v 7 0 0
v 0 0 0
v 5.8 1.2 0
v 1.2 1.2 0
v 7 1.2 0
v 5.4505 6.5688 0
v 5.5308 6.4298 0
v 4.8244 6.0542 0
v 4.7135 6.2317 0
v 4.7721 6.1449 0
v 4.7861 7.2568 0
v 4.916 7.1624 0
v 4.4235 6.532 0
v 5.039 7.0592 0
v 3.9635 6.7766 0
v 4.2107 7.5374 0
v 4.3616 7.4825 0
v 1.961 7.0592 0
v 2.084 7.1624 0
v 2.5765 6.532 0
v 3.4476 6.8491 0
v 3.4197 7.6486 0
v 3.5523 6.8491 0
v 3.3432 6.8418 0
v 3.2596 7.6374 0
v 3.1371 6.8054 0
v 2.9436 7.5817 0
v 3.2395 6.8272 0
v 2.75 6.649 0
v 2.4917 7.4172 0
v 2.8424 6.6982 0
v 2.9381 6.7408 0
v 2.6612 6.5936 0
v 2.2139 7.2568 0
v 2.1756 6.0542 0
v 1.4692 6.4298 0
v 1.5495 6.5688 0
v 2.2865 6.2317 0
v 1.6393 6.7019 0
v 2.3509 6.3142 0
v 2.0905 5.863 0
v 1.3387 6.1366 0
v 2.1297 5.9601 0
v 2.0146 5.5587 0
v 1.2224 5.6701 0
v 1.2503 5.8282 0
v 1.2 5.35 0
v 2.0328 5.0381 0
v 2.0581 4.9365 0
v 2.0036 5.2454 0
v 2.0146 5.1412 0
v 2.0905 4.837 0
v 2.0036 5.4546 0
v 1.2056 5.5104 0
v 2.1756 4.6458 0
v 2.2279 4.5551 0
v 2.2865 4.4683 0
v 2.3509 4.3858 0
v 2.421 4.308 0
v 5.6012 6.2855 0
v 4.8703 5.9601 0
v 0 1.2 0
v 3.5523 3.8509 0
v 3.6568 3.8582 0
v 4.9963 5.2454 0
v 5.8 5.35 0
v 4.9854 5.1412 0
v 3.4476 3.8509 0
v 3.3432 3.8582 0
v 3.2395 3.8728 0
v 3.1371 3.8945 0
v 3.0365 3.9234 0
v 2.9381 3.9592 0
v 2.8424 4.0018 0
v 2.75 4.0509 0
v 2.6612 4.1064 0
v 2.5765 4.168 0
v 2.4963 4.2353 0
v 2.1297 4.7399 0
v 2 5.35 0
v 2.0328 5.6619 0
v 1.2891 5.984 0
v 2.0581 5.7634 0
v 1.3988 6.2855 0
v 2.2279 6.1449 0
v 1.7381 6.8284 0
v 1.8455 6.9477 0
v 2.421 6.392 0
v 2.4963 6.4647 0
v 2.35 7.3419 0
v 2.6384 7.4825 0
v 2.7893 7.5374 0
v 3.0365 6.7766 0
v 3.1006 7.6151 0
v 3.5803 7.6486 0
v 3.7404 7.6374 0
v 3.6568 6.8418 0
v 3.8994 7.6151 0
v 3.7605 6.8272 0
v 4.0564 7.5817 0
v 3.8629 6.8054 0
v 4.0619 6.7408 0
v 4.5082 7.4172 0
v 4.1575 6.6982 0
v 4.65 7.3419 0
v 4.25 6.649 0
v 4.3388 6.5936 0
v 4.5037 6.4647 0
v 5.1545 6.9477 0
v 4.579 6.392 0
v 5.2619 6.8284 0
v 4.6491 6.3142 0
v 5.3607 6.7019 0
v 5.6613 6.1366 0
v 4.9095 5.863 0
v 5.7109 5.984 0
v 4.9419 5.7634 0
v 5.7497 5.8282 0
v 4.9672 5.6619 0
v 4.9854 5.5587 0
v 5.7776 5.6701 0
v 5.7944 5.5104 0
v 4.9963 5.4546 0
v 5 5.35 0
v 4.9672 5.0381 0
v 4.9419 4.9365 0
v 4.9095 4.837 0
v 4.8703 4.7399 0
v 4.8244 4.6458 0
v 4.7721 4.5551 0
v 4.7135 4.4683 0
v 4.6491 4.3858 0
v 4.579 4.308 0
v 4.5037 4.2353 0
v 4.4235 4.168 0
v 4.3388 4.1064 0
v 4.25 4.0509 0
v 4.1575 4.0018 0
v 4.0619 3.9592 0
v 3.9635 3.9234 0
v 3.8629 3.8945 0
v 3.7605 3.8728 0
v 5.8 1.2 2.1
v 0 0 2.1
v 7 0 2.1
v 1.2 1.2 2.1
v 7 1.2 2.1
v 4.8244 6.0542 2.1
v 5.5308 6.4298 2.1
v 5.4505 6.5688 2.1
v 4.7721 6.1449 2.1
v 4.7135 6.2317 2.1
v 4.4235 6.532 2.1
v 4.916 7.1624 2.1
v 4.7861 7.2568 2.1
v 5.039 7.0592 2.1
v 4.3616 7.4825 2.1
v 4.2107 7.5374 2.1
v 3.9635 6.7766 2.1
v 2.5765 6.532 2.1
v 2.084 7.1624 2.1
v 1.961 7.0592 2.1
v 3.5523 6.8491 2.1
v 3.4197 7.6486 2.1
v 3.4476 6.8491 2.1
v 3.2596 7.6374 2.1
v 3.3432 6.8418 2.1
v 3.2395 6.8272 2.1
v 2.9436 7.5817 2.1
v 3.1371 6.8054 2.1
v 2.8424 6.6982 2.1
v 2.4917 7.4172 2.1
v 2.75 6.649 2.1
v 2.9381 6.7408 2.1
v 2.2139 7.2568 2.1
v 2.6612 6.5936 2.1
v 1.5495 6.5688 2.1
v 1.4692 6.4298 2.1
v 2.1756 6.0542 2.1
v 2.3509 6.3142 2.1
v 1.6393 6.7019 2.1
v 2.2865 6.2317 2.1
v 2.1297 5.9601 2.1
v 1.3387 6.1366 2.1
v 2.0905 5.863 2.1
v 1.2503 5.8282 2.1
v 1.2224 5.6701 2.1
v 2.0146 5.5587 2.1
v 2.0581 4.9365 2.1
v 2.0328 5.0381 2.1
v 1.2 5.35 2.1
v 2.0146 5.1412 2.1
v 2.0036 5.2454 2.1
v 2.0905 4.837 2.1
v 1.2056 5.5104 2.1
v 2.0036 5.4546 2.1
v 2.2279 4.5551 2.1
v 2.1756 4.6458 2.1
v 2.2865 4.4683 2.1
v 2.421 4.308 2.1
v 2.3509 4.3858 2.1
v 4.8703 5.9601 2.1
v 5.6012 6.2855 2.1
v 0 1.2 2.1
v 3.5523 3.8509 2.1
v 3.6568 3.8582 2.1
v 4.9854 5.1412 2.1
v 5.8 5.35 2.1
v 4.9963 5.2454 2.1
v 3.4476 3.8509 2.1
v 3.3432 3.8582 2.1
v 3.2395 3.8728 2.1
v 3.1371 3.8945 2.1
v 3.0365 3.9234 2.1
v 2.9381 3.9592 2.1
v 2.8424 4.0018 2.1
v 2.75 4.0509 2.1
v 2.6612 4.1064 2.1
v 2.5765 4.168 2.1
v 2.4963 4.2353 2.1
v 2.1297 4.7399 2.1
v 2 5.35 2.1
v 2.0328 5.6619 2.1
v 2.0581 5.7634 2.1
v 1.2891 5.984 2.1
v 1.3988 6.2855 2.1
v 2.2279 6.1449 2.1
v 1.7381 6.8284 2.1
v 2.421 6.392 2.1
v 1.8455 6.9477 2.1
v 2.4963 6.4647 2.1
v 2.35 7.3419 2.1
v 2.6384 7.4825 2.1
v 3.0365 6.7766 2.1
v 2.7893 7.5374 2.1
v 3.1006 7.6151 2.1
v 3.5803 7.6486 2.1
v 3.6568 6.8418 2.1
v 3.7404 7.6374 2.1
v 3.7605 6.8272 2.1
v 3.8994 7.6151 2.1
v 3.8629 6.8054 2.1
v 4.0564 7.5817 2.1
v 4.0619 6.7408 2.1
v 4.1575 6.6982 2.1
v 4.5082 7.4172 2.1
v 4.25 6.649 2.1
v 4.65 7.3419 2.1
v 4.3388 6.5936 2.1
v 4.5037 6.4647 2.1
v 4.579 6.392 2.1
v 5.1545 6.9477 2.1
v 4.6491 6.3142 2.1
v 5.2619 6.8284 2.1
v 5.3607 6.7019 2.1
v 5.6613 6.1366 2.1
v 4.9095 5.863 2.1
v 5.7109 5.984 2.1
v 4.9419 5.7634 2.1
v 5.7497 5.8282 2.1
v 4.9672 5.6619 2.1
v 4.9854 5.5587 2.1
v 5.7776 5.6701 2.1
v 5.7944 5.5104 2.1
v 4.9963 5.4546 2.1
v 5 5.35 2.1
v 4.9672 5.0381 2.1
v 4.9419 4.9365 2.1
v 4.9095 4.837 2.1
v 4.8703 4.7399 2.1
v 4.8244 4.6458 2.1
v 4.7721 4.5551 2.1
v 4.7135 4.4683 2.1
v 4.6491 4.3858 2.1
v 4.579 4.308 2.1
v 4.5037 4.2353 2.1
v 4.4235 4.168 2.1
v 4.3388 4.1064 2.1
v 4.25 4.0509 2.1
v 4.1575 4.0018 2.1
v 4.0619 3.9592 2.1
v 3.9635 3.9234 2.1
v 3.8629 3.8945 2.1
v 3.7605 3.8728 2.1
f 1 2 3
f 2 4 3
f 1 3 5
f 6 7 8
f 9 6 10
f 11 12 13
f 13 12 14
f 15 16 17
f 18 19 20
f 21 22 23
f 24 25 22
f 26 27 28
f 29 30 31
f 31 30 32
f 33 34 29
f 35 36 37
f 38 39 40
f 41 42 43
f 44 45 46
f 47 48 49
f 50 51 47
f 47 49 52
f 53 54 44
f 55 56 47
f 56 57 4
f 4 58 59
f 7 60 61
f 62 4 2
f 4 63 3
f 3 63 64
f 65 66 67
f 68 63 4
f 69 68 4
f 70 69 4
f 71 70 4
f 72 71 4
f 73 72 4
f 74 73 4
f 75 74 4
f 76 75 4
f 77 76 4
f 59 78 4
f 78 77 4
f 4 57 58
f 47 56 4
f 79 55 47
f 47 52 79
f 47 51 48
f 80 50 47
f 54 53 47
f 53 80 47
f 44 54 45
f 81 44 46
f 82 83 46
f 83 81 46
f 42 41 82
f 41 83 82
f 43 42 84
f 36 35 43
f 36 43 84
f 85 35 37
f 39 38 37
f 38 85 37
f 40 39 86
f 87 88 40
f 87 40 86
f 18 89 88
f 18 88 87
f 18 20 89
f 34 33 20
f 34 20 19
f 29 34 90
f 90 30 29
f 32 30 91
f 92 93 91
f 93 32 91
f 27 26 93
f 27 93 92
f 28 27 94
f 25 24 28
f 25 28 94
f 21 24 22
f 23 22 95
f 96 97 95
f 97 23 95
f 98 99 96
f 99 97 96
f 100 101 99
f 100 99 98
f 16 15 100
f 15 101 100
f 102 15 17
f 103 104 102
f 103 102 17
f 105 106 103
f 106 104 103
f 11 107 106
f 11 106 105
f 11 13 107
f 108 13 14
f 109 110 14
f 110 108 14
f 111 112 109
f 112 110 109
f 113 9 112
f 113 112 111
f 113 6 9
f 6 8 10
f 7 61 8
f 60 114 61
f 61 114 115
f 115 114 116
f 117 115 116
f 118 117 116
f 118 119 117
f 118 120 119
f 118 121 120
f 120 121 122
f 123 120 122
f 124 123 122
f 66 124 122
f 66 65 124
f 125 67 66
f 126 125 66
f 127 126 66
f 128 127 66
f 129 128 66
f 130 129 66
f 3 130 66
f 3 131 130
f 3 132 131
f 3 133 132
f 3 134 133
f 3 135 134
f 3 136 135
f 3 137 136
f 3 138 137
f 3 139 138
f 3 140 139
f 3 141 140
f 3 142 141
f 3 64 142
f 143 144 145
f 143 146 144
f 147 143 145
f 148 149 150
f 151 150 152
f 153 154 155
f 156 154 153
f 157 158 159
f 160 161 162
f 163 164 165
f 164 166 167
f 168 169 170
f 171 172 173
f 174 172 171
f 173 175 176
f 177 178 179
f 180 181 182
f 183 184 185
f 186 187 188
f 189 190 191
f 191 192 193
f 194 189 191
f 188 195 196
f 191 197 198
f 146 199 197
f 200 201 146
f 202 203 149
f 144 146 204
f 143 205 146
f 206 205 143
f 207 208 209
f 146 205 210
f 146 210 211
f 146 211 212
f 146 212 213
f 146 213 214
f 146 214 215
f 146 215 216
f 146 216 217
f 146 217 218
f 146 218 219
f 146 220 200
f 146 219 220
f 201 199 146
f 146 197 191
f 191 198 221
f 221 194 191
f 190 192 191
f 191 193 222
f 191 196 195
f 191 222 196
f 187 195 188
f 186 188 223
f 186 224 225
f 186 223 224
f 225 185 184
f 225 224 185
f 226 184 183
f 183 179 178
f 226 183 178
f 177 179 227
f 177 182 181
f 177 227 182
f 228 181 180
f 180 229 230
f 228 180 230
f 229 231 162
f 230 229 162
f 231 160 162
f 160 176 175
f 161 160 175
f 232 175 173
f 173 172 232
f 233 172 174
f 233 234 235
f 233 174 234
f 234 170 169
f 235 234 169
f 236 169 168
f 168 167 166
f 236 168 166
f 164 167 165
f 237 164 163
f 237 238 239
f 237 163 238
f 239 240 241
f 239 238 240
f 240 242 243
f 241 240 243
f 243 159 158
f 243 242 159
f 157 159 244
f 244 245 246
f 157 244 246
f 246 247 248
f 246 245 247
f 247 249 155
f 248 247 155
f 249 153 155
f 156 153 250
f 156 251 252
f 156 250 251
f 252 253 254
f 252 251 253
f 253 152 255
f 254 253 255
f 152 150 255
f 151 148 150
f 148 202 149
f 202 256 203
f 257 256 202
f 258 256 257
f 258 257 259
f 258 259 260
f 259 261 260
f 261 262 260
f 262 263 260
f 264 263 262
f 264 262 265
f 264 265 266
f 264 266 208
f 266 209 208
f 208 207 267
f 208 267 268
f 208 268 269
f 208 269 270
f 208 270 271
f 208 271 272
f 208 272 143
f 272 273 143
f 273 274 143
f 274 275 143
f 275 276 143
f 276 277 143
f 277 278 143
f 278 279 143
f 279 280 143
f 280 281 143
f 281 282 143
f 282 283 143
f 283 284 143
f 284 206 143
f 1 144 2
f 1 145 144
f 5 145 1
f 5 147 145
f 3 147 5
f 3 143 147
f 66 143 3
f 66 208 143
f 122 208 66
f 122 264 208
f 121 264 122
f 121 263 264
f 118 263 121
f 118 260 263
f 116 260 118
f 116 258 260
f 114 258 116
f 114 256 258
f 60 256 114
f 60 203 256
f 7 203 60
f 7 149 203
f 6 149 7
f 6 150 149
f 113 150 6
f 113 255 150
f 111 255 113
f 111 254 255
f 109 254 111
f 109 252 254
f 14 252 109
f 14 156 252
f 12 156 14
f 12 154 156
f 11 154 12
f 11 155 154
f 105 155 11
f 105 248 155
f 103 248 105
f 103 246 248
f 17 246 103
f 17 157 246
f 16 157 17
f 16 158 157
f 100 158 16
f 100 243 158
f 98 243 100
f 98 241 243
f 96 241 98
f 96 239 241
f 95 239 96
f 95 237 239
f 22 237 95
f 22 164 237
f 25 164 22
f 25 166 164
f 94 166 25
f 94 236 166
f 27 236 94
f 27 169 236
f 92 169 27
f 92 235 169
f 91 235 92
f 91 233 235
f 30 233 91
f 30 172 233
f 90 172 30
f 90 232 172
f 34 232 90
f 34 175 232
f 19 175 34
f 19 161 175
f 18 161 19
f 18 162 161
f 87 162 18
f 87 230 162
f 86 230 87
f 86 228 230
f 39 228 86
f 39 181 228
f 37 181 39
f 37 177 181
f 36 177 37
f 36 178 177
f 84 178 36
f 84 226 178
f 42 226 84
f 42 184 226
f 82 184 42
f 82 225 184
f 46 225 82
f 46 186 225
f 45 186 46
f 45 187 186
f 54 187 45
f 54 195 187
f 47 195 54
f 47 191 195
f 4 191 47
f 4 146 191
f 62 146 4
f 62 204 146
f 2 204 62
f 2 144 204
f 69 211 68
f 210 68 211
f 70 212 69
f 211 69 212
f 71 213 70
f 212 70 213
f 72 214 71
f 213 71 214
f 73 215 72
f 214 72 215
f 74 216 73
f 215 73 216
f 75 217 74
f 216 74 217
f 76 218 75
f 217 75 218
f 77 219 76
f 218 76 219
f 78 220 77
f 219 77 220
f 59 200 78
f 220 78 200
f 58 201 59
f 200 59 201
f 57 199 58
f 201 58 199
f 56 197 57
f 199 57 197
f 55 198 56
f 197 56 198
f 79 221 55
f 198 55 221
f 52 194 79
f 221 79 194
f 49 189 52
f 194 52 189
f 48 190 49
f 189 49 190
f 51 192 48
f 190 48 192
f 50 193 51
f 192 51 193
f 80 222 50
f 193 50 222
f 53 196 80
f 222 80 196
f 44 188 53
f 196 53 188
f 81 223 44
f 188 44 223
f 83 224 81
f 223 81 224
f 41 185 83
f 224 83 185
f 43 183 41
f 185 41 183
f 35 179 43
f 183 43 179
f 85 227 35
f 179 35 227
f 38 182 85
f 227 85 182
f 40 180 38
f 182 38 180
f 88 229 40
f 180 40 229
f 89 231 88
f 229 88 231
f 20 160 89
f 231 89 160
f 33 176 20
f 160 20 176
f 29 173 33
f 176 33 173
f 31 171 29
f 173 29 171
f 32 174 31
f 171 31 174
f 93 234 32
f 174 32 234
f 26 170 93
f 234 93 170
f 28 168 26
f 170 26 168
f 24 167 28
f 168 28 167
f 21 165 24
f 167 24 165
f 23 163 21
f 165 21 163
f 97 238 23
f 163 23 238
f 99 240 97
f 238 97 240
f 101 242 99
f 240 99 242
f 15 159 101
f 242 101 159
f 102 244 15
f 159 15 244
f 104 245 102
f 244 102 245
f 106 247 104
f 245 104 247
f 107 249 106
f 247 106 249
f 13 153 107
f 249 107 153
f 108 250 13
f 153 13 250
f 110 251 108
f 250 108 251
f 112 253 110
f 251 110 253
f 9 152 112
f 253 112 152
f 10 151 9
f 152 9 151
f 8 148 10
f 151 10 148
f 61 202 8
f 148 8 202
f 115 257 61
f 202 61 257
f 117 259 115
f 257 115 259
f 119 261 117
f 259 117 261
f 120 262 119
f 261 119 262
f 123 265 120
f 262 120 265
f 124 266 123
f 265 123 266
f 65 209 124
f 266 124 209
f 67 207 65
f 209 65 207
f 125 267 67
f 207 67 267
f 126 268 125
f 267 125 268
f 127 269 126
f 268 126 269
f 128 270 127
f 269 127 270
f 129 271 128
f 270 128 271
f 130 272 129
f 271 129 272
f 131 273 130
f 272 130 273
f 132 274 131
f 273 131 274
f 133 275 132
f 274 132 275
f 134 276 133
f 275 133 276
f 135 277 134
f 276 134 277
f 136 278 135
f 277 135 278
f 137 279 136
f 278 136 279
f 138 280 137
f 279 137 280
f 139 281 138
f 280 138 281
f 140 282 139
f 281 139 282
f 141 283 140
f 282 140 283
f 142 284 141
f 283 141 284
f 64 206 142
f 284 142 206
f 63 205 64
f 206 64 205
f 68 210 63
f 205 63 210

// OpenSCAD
hole_rad = 2.5;
hole_height = 2.1;
hole_tolerance = .4;

base_length = (.2 * 6);
base_width = hole_rad * 2 + 2;

center_width = base_length /2;



linear_extrude(height=hole_rad - hole_tolerance) {

    // Base
    square([base_width, base_length], center=false);


    // Stem
    stem_length = hole_height + (hole_height/2) + 1;
    stem_width = (hole_rad * 2) - hole_tolerance;
    stem_left = (base_width - stem_width) /2 ;

    echo(stem_width=stem_width);
    echo(stem_length=stem_length);
    echo(base_width=base_width);
    echo(base_length=base_length);
            $fn = 90;
    difference() {

            // Loop
            loop_rad = stem_width / 2;
            loop_bottom = base_length + stem_length + loop_rad;
            loop_left = base_width / 2;
            loop_thickness = 1;

        union() {

            translate([stem_left,base_length])
                square([stem_width, stem_length], center=false);



            echo(loop_rad=loop_rad);
            echo(loop_bottom=loop_bottom);
            echo(loop_left=loop_left);


            translate([loop_left, loop_bottom - loop_rad ])
                    circle(r=loop_rad);
        }

        // Loop Hole
        translate([loop_left, loop_bottom - loop_rad])
            circle(r=hole_rad - loop_thickness);
    }
}
